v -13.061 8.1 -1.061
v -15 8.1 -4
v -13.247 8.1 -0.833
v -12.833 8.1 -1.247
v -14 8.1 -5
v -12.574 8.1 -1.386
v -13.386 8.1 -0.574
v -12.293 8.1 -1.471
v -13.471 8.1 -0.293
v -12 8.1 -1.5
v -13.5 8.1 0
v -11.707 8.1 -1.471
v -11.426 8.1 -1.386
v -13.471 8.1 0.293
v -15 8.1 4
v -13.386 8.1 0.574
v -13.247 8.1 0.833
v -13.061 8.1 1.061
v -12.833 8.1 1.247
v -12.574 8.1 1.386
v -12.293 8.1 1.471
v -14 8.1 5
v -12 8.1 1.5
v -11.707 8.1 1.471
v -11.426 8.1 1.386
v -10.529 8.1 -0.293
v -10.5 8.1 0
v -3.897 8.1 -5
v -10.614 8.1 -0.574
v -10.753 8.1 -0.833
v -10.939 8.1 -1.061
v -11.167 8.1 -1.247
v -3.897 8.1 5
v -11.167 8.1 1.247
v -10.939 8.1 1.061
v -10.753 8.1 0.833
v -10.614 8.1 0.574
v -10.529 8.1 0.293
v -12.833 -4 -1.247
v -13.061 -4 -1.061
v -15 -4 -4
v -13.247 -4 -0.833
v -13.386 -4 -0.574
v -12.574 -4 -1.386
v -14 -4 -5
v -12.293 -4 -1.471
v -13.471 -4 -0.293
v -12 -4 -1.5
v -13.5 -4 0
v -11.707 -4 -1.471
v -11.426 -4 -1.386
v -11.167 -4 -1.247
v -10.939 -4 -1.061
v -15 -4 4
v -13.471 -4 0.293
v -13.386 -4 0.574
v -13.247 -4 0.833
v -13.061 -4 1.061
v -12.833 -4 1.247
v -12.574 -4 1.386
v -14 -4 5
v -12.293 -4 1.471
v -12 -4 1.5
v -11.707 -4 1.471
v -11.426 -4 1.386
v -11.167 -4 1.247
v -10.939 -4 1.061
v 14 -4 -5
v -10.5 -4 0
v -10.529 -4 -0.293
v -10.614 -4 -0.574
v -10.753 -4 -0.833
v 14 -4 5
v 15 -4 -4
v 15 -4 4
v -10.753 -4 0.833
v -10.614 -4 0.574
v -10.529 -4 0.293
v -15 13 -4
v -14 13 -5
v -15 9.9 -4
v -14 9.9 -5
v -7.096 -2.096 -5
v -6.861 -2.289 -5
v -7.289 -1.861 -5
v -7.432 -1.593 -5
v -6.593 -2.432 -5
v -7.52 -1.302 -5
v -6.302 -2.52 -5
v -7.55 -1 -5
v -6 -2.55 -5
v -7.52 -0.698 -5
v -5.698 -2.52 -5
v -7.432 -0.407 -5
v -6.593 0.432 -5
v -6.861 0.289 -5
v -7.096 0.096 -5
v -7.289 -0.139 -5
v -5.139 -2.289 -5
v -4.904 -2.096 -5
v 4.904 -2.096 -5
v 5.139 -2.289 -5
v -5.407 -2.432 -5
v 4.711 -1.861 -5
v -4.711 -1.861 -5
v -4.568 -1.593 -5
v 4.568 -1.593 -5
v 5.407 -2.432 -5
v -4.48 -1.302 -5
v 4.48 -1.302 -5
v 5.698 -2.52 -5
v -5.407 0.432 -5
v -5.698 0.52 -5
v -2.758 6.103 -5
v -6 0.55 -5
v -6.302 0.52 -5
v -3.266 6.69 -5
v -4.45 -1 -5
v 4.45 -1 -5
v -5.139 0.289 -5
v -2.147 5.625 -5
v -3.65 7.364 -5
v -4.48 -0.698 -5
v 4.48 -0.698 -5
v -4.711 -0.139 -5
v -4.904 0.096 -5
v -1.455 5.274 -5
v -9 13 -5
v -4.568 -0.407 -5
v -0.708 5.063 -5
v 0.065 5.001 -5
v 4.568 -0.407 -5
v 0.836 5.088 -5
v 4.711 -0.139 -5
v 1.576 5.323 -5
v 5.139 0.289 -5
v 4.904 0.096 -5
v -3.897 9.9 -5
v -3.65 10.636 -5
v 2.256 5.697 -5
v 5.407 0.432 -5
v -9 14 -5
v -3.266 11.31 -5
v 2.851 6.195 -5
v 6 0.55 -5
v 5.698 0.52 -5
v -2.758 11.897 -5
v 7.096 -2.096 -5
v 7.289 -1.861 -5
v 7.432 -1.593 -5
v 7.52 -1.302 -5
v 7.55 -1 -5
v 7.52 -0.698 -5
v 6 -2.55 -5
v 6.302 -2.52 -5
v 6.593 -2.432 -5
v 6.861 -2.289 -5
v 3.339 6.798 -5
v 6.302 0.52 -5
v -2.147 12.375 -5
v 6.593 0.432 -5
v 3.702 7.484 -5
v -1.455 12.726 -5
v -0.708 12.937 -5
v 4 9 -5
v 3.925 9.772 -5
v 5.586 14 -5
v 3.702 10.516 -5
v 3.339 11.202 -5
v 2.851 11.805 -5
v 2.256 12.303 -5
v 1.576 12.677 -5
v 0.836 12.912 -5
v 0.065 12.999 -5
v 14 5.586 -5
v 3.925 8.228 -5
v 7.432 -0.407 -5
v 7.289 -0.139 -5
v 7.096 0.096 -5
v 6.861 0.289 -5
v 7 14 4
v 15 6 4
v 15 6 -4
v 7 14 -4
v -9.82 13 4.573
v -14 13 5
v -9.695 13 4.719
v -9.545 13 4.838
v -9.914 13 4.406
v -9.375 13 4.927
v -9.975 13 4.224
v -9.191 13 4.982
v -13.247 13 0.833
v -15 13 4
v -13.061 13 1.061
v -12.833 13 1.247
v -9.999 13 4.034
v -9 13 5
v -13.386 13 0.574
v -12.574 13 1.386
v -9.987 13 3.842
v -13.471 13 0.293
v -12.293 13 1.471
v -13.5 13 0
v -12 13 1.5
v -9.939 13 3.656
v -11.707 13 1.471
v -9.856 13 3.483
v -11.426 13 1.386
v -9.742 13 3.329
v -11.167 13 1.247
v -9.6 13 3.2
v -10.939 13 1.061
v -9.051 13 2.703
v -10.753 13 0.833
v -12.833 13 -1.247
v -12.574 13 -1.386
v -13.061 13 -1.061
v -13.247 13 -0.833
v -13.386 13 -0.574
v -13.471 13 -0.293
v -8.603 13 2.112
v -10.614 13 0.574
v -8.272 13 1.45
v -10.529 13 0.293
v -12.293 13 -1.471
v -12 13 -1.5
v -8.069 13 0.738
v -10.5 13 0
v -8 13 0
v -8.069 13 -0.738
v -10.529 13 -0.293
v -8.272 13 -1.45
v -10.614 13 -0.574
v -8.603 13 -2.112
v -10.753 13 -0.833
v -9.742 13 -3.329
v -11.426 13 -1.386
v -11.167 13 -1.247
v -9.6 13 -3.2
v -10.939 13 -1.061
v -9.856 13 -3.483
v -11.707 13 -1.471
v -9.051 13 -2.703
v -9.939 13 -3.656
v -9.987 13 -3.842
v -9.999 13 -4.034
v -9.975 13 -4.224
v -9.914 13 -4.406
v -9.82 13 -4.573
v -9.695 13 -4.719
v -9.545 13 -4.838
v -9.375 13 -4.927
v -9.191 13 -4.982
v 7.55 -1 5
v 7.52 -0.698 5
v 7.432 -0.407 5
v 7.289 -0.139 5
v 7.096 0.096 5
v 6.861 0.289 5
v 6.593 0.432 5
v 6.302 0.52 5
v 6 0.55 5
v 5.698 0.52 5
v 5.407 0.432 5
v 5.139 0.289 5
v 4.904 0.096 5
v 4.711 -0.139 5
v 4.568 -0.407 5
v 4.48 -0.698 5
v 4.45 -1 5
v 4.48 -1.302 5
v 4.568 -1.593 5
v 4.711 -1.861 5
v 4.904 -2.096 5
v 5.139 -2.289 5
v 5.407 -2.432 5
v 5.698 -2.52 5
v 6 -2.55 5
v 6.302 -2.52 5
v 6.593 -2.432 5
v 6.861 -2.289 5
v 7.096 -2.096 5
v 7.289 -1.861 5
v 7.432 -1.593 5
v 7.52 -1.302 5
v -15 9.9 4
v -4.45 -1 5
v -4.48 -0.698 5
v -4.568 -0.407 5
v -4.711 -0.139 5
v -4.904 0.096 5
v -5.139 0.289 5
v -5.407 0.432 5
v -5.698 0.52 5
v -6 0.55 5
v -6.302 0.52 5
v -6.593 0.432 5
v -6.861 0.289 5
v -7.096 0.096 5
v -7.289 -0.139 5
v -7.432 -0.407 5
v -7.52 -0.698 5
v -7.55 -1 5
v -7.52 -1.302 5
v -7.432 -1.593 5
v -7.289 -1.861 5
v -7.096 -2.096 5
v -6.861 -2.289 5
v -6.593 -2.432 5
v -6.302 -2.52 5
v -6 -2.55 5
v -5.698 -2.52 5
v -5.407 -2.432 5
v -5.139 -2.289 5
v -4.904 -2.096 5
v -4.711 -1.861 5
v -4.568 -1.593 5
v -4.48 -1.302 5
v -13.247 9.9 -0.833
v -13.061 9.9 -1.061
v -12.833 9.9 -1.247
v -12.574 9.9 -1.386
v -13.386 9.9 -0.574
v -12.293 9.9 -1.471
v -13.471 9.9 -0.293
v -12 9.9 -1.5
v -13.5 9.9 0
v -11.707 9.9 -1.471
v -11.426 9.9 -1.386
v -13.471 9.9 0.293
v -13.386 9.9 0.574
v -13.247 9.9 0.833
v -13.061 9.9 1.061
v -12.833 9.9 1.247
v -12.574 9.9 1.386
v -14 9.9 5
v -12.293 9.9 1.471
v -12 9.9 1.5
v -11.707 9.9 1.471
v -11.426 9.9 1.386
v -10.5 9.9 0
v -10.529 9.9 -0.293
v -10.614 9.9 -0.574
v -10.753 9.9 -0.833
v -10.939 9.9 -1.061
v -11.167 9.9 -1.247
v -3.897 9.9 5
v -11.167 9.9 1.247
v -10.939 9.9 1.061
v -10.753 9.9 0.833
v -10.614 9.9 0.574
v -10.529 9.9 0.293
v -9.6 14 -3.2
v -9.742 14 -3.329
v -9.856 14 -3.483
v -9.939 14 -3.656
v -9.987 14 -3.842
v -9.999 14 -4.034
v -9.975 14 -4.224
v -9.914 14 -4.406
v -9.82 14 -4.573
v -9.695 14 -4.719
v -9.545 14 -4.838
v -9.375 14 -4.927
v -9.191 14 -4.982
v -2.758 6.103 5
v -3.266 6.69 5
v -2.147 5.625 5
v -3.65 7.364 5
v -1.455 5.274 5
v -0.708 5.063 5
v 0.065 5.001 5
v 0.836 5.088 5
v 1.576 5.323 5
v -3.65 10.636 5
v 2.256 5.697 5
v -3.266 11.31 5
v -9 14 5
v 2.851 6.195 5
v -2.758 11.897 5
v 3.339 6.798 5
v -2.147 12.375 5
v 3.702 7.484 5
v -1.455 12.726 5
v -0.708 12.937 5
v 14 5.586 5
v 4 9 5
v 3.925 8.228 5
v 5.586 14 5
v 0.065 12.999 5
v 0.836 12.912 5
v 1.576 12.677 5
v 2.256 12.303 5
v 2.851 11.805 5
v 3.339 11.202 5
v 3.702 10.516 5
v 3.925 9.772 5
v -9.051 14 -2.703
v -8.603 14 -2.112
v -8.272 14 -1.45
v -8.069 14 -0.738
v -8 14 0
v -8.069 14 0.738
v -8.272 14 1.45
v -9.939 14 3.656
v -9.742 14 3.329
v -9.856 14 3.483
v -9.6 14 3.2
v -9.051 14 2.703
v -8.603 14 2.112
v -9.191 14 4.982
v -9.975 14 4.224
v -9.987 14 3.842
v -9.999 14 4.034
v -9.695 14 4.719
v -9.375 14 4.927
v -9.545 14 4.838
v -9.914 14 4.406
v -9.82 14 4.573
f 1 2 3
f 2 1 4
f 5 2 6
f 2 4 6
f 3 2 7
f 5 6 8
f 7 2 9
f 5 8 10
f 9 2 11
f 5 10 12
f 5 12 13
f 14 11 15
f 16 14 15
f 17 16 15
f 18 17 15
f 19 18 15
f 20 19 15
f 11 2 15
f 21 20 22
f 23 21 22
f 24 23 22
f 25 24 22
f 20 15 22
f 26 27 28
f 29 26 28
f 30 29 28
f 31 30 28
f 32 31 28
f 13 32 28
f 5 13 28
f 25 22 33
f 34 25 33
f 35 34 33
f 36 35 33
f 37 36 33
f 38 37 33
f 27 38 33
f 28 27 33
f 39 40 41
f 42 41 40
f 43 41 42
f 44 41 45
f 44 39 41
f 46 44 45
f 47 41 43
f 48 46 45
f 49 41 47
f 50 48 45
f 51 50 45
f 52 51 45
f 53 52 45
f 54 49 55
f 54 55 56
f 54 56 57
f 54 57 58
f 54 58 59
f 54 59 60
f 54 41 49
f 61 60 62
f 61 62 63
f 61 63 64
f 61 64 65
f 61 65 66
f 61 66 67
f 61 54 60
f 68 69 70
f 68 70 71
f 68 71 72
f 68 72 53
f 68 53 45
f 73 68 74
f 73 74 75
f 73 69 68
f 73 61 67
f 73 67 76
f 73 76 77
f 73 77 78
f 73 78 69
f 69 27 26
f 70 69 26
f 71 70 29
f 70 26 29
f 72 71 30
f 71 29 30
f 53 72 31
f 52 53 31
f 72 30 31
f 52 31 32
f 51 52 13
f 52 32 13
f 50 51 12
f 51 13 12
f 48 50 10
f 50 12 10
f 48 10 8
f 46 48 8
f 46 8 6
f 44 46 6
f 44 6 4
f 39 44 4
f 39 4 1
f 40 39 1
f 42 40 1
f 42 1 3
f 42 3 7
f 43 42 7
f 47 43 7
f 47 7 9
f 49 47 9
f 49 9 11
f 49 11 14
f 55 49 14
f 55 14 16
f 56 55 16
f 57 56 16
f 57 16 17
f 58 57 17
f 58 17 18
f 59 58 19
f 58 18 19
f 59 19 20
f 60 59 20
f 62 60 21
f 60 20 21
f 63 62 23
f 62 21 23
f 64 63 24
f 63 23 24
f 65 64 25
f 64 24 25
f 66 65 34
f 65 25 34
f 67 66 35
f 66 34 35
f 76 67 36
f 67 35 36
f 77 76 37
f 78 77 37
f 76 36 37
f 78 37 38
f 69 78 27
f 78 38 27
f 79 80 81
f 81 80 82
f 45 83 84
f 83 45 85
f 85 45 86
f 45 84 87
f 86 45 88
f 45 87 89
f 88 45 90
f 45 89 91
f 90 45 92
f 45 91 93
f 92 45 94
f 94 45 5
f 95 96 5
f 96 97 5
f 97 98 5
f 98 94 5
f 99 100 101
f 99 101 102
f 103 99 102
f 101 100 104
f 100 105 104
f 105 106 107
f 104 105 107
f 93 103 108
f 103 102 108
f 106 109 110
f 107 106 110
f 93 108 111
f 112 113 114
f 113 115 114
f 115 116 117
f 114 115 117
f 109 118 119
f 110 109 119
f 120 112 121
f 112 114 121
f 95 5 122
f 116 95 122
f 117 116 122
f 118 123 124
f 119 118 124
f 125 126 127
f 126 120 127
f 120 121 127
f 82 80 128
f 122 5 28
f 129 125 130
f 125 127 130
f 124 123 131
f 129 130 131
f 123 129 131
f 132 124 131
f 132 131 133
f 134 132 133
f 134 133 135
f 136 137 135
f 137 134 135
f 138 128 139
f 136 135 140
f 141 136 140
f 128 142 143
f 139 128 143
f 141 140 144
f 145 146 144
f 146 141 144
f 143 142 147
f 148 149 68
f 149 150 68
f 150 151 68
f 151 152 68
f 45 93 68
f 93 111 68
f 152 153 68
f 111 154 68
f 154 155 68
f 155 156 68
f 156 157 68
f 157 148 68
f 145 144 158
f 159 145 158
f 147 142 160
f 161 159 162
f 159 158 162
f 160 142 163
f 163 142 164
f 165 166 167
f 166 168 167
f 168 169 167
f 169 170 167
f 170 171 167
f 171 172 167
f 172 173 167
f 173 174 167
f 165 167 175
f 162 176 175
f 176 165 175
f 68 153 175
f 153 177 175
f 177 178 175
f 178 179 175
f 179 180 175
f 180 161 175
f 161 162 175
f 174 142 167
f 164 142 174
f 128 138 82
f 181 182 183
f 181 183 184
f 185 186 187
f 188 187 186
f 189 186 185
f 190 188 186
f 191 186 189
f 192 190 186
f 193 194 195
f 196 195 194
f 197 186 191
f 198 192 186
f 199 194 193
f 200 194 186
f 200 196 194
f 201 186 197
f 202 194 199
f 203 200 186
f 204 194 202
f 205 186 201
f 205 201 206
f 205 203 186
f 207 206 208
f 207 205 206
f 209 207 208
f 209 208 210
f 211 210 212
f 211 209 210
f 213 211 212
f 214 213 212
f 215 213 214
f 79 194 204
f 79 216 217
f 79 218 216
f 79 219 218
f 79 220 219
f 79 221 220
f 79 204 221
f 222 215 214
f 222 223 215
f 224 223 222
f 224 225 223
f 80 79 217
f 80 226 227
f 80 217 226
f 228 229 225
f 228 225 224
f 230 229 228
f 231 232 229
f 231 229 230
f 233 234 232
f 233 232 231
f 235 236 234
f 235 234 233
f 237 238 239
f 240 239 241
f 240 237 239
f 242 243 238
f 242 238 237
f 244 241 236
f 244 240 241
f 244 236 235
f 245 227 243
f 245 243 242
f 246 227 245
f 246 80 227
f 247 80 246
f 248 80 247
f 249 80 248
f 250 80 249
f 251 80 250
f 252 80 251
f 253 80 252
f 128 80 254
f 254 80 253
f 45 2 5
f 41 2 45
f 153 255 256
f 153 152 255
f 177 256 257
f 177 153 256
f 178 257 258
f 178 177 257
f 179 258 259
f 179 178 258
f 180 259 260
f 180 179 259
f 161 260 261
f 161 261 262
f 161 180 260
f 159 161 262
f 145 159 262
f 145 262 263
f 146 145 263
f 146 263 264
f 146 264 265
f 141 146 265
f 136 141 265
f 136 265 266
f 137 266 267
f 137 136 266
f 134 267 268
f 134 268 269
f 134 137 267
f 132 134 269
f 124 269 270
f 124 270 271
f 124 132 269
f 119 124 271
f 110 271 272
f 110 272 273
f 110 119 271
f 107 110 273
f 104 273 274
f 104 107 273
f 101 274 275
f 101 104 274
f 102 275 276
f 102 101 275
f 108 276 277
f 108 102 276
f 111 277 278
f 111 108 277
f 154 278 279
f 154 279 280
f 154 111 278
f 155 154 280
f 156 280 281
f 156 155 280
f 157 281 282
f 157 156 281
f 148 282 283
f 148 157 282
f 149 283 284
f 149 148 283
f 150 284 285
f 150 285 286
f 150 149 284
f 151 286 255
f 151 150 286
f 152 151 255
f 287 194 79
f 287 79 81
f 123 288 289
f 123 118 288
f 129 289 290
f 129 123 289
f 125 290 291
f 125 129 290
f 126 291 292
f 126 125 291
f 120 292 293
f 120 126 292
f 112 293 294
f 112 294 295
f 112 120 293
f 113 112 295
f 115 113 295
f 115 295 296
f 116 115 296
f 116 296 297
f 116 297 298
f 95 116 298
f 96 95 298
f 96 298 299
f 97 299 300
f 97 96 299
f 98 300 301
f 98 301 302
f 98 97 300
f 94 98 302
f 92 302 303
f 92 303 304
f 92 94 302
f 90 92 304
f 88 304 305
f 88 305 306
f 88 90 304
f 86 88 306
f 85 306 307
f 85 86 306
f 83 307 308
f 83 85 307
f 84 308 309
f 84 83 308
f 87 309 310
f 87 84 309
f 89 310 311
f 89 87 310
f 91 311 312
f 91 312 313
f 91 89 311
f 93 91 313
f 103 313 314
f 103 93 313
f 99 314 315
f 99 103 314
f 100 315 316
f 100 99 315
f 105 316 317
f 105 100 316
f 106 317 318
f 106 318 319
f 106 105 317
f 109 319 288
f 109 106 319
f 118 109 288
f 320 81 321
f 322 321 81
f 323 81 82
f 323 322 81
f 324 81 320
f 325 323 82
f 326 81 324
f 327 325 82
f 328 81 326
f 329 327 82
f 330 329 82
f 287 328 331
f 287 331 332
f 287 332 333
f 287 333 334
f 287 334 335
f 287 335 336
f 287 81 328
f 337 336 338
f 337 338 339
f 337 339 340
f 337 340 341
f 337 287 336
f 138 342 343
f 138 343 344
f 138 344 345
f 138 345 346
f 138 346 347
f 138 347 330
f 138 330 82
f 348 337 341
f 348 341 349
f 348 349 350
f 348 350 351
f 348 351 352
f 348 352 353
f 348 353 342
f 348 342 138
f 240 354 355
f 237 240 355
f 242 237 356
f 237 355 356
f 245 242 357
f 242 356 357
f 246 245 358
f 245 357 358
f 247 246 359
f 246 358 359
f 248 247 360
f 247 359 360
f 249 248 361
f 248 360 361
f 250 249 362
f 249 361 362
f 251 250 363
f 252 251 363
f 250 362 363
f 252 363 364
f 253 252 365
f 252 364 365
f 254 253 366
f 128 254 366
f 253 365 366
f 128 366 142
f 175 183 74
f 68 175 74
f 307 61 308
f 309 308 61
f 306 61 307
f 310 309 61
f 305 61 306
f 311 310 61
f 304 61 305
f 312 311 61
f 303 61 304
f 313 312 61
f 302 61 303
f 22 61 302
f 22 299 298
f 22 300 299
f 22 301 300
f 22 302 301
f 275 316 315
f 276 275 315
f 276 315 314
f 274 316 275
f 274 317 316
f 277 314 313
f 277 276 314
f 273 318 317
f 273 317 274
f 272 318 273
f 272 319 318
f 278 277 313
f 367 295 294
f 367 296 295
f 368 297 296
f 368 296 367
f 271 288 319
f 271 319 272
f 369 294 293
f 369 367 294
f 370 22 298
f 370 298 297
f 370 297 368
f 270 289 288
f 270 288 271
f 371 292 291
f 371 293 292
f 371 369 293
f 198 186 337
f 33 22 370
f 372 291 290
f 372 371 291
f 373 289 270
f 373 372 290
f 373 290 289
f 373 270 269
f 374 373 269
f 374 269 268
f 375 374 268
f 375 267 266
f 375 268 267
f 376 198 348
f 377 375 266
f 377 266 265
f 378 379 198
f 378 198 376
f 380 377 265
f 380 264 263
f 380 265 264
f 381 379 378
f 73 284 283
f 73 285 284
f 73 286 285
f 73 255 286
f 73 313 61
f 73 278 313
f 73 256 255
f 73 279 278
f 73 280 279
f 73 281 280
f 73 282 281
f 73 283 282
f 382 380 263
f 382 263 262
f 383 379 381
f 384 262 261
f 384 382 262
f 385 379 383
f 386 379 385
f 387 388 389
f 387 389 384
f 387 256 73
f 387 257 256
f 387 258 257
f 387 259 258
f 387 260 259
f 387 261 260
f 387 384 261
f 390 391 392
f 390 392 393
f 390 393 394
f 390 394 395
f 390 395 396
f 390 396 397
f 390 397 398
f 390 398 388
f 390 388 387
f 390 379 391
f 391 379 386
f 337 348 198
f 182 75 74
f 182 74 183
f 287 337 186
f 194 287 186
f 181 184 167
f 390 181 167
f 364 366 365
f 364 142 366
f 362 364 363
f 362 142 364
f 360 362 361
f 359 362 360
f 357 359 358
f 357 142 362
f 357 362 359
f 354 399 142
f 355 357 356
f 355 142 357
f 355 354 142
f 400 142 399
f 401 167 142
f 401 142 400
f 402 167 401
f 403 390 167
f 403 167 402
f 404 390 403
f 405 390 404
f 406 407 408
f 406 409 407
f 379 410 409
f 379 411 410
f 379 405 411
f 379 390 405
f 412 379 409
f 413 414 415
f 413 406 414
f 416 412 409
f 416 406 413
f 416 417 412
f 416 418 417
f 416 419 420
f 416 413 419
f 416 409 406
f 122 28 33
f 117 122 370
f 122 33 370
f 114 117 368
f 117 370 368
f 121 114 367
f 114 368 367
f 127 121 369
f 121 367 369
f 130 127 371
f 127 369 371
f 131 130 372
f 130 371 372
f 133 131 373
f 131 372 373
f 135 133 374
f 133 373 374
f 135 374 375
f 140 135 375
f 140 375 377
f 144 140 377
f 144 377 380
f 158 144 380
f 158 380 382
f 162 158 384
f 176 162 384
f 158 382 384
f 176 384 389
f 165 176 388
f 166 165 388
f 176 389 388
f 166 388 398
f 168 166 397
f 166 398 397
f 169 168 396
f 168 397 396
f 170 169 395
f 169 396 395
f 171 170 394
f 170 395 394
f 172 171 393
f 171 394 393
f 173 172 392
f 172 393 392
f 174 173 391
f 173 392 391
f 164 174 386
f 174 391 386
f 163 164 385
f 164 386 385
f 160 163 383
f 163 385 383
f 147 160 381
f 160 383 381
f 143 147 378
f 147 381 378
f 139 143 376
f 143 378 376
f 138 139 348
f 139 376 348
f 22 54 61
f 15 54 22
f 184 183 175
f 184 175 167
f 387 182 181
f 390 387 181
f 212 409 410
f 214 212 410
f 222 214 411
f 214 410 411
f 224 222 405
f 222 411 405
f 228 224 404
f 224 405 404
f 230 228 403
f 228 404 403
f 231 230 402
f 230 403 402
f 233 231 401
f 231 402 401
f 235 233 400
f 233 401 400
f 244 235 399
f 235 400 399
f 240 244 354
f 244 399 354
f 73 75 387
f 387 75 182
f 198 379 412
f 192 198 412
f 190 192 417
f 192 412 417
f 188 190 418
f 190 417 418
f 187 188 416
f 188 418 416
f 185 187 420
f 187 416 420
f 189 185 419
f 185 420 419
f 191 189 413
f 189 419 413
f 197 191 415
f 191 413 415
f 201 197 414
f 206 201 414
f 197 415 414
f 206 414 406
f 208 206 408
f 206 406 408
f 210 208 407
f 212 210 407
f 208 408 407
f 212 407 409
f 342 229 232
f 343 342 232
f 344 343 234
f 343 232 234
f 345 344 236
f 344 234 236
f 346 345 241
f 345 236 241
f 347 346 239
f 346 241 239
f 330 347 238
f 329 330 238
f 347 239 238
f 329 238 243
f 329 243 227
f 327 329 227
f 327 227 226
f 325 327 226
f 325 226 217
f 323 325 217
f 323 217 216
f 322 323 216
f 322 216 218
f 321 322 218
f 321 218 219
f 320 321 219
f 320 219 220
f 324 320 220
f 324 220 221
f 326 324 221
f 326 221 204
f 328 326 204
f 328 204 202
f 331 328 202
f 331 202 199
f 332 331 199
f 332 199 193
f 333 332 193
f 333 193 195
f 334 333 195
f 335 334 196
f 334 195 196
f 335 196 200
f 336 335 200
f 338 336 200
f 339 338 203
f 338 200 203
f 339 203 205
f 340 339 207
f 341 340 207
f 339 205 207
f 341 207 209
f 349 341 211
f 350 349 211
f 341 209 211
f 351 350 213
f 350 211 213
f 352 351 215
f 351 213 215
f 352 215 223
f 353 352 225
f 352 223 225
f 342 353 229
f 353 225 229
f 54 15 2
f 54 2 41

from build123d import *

# Parameters (mm, degrees)
SKETCH3_W                    = 30
SKETCH3_H                    = 8
SKETCH3_R                    = 1.55
BOSS_EXTRUDE1_DEPTH          = 5
SKETCH6_R                    = 4
BOSS_EXTRUDE2_DEPTH          = 10
SKETCH8_W                    = 15
SKETCH8_H                    = 1.8
CUT_EXTRUDE_THIN1_DEPTH      = 1
CUT_EXTRUDE_THIN1_DEPTH_BACK = 11
SKETCH9_R                    = 1.5
CUT_EXTRUDE1_DEPTH           = 19
CUT_EXTRUDE2_DEPTH           = 1
CHAMFER2_SIZE                = 1


with BuildPart() as part:
    # Sketch3 → Boss-Extrude1 (new body, symmetric)
    with BuildSketch(Plane.XY):
        Rectangle(SKETCH3_W, SKETCH3_H)
        with Locations((-6, -1)):
            Circle(SKETCH3_R, mode=Mode.SUBTRACT)
        with Locations((6, -1)):
            Circle(SKETCH3_R, mode=Mode.SUBTRACT)
    extrude(amount=BOSS_EXTRUDE1_DEPTH, both=True)

    # Sketch6 → Boss-Extrude2 (add)
    with BuildSketch(Plane.XY.offset(5)):
        Polygon((-15, 4), (15, 4), (15, 6), (7, 14), (-15, 14), align=None)
        with Locations((0, 9)):
            Circle(SKETCH6_R, mode=Mode.SUBTRACT)
    extrude(amount=-BOSS_EXTRUDE2_DEPTH)

    # Sketch8 → Cut-Extrude-Thin1 (cut, two sides)
    with BuildSketch(Plane.XY.offset(5)) as cut_extrude_thin1_sk:
        with Locations((-7.5, 9)):
            Rectangle(SKETCH8_W, SKETCH8_H)
    extrude(amount=CUT_EXTRUDE_THIN1_DEPTH, mode=Mode.SUBTRACT)
    extrude(cut_extrude_thin1_sk.sketch, amount=-CUT_EXTRUDE_THIN1_DEPTH_BACK, mode=Mode.SUBTRACT)

    # Sketch9 → Cut-Extrude1 (cut, through all)
    with BuildSketch(Plane(origin=(0, 14, 0), x_dir=(1, 0, 0), z_dir=(0, 1, 0))):
        with Locations((-12, 0)):
            Circle(SKETCH9_R)
    extrude(amount=-CUT_EXTRUDE1_DEPTH, mode=Mode.SUBTRACT)

    # Sketch10 → Cut-Extrude2 (cut)
    with BuildSketch(Plane(origin=(0, 14, 0), x_dir=(1, 0, 0), z_dir=(0, 1, 0))):
        with BuildLine():
            Line((-9, 5), (-15, 5))
            Line((-15, 5), (-15, -5))
            Line((-15, -5), (-9, -5))
            ThreePointArc((-9, -5), (-9.948683298, -4.316227766), (-9.6, -3.2))
            ThreePointArc((-9.6, -3.2), (-8, 0), (-9.6, 3.2))
            ThreePointArc((-9.6, 3.2), (-9.948683298, 4.316227766), (-9, 5))
        make_face()
    extrude(amount=-CUT_EXTRUDE2_DEPTH, mode=Mode.SUBTRACT)

    # Chamfer2
    chamfer2_edges = [part.edges().sort_by_distance(p)[0] for p in [
        (11, 10, -5),
        (11, 10, 5),
        (-15, 2.05, -5),
        (-15, 2.05, 5),
        (15, 1, 5),
        (15, 1, -5),
        (-15, 11.45, -5),
        (-15, 11.45, 5),
    ]]
    chamfer(chamfer2_edges, length=CHAMFER2_SIZE)


solid = part.part
